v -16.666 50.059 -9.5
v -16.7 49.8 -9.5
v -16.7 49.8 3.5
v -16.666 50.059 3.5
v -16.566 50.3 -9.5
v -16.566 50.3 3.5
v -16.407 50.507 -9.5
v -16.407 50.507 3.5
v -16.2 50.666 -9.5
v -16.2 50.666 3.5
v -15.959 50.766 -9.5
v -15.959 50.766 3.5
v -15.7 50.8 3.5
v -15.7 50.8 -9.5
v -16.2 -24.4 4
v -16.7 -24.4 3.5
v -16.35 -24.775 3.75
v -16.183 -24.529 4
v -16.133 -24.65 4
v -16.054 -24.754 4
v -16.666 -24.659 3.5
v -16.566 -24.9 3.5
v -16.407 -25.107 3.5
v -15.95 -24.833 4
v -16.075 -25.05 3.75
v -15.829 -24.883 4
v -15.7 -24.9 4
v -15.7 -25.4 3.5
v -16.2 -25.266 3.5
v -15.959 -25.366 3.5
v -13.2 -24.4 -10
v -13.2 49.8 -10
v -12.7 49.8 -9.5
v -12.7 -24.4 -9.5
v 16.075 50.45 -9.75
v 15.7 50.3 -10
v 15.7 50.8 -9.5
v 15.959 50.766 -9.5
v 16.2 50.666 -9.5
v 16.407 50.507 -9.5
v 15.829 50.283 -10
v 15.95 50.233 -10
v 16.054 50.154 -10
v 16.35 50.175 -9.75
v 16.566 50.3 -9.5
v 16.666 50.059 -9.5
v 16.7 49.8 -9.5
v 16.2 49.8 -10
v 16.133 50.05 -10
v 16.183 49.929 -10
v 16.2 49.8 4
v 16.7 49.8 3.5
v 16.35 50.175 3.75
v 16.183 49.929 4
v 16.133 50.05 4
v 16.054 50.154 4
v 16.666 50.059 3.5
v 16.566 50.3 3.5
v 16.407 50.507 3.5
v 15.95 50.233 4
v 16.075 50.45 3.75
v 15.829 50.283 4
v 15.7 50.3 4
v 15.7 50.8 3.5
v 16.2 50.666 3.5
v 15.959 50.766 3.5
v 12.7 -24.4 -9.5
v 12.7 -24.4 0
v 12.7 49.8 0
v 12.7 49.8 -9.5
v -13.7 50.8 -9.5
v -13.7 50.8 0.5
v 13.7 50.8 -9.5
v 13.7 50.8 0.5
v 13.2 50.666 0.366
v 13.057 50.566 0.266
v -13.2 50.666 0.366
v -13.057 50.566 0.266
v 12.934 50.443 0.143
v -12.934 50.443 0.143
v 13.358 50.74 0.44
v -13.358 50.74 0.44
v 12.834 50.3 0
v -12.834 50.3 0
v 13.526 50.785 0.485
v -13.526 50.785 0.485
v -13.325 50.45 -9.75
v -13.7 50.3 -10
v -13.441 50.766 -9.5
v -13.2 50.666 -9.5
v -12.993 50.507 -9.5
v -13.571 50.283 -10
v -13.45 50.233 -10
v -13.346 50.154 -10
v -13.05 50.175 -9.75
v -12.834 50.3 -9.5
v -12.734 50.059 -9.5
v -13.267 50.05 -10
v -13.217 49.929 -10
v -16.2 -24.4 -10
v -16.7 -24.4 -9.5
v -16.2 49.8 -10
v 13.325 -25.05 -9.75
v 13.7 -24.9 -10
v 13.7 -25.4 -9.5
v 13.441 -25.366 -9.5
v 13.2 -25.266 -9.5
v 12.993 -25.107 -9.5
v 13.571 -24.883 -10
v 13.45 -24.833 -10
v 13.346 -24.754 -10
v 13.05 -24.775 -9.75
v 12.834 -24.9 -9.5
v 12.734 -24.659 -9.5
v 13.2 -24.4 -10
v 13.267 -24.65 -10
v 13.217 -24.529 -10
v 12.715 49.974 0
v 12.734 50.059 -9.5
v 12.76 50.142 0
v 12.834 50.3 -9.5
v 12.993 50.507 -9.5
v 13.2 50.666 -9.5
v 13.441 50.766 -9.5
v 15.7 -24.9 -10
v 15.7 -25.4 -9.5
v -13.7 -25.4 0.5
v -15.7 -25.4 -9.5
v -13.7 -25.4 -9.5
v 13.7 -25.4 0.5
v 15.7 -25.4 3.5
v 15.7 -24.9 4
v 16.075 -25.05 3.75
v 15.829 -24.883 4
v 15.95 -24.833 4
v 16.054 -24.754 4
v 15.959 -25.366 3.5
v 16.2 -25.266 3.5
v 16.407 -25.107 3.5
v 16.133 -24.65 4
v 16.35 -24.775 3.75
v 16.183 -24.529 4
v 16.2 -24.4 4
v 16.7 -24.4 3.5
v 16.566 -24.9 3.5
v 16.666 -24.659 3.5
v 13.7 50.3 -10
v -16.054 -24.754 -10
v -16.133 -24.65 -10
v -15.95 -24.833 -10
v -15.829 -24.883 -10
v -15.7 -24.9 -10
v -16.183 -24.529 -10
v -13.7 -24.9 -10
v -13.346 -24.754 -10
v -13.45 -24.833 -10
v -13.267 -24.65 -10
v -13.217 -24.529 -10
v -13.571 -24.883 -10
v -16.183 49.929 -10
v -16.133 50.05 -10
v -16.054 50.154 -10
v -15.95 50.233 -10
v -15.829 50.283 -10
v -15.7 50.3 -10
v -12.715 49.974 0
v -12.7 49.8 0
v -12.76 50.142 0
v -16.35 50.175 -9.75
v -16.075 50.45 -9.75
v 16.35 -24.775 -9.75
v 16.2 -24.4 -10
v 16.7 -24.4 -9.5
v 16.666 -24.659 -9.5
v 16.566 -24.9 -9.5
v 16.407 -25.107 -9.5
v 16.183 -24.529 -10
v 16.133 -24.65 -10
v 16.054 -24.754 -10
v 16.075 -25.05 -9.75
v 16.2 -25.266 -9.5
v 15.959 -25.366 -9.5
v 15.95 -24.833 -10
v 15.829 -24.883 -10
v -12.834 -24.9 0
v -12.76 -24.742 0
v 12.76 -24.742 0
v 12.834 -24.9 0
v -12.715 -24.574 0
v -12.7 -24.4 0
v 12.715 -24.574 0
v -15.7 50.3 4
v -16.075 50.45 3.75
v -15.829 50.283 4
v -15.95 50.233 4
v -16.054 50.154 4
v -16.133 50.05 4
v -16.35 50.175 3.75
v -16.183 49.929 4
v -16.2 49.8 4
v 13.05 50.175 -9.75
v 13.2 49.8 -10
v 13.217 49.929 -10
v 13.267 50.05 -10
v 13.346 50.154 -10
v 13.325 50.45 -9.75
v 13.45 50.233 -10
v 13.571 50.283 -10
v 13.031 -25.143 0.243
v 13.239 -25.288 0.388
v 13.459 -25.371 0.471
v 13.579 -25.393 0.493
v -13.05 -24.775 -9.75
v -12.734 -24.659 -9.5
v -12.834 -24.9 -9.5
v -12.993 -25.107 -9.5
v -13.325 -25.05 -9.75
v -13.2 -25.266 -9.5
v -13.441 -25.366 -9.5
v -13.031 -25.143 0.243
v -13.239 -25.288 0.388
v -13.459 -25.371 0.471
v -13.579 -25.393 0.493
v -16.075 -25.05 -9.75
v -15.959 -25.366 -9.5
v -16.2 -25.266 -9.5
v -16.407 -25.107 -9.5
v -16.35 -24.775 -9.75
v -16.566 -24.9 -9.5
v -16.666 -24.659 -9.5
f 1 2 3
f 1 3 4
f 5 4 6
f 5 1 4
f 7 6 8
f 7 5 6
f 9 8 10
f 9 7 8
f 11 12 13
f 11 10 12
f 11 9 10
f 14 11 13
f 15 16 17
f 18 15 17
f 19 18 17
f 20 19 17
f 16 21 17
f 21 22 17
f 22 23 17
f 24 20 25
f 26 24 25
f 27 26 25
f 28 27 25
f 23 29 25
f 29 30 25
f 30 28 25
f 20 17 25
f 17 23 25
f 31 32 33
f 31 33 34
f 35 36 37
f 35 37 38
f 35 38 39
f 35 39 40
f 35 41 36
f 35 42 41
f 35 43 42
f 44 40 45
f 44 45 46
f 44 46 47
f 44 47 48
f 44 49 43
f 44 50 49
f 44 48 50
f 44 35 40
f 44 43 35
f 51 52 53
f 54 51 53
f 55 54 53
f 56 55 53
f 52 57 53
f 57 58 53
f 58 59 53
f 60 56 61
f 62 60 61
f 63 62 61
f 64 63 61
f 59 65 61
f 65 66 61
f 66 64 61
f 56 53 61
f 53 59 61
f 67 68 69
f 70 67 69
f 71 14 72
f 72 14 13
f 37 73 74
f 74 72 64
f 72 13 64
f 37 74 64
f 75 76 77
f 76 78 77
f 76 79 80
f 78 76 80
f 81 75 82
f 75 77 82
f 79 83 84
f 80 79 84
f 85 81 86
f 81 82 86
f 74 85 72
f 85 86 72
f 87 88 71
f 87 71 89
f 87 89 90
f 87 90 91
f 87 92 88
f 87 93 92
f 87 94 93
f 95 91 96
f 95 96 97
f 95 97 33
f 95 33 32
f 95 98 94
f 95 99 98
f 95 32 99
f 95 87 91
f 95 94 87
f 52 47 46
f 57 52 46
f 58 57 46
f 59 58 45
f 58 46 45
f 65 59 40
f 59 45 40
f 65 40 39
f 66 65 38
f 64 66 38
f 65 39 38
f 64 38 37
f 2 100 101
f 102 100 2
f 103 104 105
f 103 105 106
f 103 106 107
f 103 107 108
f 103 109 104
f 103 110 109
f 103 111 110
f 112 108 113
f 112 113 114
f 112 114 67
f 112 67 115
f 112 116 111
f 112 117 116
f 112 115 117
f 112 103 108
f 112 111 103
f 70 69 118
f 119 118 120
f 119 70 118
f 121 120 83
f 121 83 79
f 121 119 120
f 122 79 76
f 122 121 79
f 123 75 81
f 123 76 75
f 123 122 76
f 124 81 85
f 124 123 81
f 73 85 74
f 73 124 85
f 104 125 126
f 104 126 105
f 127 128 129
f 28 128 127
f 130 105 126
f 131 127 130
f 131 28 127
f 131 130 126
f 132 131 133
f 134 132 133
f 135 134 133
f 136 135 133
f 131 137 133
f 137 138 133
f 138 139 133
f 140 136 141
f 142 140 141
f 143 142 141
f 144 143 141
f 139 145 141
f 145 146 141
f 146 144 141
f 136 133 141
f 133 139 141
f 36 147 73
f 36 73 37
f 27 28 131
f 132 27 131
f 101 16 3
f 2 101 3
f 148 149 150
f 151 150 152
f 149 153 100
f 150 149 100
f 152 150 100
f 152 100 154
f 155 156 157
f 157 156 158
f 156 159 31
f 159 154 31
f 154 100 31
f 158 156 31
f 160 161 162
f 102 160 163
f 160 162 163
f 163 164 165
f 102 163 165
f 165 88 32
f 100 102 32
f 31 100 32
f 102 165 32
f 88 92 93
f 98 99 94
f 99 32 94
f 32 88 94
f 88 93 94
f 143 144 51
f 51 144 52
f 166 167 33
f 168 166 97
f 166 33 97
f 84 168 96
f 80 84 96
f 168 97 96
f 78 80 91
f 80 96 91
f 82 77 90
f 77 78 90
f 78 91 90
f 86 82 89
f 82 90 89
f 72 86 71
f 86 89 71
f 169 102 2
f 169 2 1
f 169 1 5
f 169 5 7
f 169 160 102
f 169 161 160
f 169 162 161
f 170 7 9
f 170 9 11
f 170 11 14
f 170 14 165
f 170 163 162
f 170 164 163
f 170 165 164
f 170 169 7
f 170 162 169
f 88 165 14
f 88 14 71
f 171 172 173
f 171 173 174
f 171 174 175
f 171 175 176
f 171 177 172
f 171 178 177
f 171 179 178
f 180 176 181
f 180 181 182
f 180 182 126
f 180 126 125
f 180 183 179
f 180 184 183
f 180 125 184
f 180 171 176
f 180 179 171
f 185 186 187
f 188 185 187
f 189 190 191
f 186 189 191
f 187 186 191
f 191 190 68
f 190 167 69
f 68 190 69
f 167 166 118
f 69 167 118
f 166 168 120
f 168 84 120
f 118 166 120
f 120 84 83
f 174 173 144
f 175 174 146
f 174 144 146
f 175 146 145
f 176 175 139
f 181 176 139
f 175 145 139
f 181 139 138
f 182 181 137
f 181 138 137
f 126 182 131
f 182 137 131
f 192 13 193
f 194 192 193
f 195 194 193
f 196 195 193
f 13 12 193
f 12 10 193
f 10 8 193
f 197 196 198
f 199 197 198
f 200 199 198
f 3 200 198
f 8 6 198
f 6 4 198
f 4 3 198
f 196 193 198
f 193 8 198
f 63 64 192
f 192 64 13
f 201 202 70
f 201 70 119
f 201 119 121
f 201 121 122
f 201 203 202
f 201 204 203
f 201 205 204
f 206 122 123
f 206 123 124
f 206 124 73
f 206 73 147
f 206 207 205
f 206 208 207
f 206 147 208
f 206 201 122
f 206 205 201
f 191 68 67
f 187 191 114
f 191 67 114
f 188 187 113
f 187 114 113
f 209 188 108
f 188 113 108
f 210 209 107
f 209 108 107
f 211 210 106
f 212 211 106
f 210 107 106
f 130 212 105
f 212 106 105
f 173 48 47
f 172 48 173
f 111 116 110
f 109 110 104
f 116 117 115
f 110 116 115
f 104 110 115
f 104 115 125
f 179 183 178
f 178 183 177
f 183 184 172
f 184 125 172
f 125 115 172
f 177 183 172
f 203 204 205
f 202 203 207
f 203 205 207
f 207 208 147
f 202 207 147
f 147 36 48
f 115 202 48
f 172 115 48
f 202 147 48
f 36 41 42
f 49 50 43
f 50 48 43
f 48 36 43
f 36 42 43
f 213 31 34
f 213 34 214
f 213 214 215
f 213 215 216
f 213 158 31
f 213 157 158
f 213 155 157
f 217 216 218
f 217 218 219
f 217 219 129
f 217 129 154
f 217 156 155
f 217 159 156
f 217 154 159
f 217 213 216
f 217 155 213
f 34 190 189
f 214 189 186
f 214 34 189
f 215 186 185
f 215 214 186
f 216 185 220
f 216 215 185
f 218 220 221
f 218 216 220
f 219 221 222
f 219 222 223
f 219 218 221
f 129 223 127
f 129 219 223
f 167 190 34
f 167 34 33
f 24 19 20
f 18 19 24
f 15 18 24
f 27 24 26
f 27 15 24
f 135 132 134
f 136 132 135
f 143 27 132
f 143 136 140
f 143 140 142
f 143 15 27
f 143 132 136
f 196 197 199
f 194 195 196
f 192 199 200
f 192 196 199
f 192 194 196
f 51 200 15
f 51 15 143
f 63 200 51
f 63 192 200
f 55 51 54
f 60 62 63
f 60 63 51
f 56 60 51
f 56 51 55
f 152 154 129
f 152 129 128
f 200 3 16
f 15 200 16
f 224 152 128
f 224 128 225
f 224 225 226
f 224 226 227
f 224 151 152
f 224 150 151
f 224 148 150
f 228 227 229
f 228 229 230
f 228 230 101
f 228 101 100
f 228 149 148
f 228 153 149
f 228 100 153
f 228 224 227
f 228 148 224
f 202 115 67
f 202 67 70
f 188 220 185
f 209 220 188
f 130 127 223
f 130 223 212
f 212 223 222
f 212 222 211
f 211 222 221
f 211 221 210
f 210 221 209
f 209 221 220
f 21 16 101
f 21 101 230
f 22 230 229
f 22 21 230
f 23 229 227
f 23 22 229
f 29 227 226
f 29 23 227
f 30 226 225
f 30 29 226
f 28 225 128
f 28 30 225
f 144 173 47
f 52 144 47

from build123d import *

# Parameters (mm, degrees)
SKETCH1_W           = 33.4
SKETCH1_H           = 76.2
BOSS_EXTRUDE1_DEPTH = 4
SKETCH1_3_W         = 4
SKETCH1_3_H         = 76.2
BOSS_EXTRUDE2_DEPTH = 10
FILLET1_R           = 1
CHAMFER1_SIZE       = 0.5


with BuildPart() as part:
    # Sketch1 → Boss-Extrude1 (new body)
    with BuildSketch(Plane.XY):
        with Locations((0, 12.7)):
            Rectangle(SKETCH1_W, SKETCH1_H)
    extrude(amount=BOSS_EXTRUDE1_DEPTH)

    # Sketch1<3> → Boss-Extrude2 (add)
    with BuildSketch(Plane.XY):
        with Locations((-14.7, 12.7)):
            Rectangle(SKETCH1_3_W, SKETCH1_3_H)
        with Locations((14.7, 12.7)):
            Rectangle(SKETCH1_3_W, SKETCH1_3_H)
    extrude(amount=-BOSS_EXTRUDE2_DEPTH)

    # Fillet1
    fillet1_edges = [part.edges().sort_by_distance(p)[0] for p in [
        (12.7, 50.8, -5),
        (-12.7, 50.8, -5),
        (-12.7, -25.4, -5),
        (12.7, -25.4, -5),
        (-16.7, -25.4, -3),
        (16.7, -25.4, -3),
        (16.7, 50.8, -3),
        (-16.7, 50.8, -3),
    ]]
    fillet(fillet1_edges, radius=FILLET1_R)

    # Chamfer1
    chamfer1_edges = [part.edges().sort_by_distance(p)[0] for p in [
        (-16.407106781, 50.507106781, 4),
        (0, 50.8, 4),
        (16.407106781, 50.507106781, 4),
        (16.7, 12.7, 4),
        (16.407106781, -25.107106781, 4),
        (0, -25.4, 4),
        (-16.407106781, -25.107106781, 4),
        (-16.7, 12.7, 4),
        (-16.407106781, 50.507106781, -10),
        (-16.7, 12.7, -10),
        (-16.407106781, -25.107106781, -10),
        (-14.7, -25.4, -10),
        (-12.992893219, -25.107106781, -10),
        (-12.7, 12.7, -10),
        (-12.992893219, 50.507106781, -10),
        (-14.7, 50.8, -10),
        (12.992893219, -25.107106781, -10),
        (14.7, -25.4, -10),
        (16.407106781, -25.107106781, -10),
        (16.7, 12.7, -10),
        (16.407106781, 50.507106781, -10),
        (14.7, 50.8, -10),
        (12.992893219, 50.507106781, -10),
        (12.7, 12.7, -10),
        (0, 50.8, 0),
        (0, -25.4, 0),
    ]]
    chamfer(chamfer1_edges, length=CHAMFER1_SIZE)


solid = part.part
